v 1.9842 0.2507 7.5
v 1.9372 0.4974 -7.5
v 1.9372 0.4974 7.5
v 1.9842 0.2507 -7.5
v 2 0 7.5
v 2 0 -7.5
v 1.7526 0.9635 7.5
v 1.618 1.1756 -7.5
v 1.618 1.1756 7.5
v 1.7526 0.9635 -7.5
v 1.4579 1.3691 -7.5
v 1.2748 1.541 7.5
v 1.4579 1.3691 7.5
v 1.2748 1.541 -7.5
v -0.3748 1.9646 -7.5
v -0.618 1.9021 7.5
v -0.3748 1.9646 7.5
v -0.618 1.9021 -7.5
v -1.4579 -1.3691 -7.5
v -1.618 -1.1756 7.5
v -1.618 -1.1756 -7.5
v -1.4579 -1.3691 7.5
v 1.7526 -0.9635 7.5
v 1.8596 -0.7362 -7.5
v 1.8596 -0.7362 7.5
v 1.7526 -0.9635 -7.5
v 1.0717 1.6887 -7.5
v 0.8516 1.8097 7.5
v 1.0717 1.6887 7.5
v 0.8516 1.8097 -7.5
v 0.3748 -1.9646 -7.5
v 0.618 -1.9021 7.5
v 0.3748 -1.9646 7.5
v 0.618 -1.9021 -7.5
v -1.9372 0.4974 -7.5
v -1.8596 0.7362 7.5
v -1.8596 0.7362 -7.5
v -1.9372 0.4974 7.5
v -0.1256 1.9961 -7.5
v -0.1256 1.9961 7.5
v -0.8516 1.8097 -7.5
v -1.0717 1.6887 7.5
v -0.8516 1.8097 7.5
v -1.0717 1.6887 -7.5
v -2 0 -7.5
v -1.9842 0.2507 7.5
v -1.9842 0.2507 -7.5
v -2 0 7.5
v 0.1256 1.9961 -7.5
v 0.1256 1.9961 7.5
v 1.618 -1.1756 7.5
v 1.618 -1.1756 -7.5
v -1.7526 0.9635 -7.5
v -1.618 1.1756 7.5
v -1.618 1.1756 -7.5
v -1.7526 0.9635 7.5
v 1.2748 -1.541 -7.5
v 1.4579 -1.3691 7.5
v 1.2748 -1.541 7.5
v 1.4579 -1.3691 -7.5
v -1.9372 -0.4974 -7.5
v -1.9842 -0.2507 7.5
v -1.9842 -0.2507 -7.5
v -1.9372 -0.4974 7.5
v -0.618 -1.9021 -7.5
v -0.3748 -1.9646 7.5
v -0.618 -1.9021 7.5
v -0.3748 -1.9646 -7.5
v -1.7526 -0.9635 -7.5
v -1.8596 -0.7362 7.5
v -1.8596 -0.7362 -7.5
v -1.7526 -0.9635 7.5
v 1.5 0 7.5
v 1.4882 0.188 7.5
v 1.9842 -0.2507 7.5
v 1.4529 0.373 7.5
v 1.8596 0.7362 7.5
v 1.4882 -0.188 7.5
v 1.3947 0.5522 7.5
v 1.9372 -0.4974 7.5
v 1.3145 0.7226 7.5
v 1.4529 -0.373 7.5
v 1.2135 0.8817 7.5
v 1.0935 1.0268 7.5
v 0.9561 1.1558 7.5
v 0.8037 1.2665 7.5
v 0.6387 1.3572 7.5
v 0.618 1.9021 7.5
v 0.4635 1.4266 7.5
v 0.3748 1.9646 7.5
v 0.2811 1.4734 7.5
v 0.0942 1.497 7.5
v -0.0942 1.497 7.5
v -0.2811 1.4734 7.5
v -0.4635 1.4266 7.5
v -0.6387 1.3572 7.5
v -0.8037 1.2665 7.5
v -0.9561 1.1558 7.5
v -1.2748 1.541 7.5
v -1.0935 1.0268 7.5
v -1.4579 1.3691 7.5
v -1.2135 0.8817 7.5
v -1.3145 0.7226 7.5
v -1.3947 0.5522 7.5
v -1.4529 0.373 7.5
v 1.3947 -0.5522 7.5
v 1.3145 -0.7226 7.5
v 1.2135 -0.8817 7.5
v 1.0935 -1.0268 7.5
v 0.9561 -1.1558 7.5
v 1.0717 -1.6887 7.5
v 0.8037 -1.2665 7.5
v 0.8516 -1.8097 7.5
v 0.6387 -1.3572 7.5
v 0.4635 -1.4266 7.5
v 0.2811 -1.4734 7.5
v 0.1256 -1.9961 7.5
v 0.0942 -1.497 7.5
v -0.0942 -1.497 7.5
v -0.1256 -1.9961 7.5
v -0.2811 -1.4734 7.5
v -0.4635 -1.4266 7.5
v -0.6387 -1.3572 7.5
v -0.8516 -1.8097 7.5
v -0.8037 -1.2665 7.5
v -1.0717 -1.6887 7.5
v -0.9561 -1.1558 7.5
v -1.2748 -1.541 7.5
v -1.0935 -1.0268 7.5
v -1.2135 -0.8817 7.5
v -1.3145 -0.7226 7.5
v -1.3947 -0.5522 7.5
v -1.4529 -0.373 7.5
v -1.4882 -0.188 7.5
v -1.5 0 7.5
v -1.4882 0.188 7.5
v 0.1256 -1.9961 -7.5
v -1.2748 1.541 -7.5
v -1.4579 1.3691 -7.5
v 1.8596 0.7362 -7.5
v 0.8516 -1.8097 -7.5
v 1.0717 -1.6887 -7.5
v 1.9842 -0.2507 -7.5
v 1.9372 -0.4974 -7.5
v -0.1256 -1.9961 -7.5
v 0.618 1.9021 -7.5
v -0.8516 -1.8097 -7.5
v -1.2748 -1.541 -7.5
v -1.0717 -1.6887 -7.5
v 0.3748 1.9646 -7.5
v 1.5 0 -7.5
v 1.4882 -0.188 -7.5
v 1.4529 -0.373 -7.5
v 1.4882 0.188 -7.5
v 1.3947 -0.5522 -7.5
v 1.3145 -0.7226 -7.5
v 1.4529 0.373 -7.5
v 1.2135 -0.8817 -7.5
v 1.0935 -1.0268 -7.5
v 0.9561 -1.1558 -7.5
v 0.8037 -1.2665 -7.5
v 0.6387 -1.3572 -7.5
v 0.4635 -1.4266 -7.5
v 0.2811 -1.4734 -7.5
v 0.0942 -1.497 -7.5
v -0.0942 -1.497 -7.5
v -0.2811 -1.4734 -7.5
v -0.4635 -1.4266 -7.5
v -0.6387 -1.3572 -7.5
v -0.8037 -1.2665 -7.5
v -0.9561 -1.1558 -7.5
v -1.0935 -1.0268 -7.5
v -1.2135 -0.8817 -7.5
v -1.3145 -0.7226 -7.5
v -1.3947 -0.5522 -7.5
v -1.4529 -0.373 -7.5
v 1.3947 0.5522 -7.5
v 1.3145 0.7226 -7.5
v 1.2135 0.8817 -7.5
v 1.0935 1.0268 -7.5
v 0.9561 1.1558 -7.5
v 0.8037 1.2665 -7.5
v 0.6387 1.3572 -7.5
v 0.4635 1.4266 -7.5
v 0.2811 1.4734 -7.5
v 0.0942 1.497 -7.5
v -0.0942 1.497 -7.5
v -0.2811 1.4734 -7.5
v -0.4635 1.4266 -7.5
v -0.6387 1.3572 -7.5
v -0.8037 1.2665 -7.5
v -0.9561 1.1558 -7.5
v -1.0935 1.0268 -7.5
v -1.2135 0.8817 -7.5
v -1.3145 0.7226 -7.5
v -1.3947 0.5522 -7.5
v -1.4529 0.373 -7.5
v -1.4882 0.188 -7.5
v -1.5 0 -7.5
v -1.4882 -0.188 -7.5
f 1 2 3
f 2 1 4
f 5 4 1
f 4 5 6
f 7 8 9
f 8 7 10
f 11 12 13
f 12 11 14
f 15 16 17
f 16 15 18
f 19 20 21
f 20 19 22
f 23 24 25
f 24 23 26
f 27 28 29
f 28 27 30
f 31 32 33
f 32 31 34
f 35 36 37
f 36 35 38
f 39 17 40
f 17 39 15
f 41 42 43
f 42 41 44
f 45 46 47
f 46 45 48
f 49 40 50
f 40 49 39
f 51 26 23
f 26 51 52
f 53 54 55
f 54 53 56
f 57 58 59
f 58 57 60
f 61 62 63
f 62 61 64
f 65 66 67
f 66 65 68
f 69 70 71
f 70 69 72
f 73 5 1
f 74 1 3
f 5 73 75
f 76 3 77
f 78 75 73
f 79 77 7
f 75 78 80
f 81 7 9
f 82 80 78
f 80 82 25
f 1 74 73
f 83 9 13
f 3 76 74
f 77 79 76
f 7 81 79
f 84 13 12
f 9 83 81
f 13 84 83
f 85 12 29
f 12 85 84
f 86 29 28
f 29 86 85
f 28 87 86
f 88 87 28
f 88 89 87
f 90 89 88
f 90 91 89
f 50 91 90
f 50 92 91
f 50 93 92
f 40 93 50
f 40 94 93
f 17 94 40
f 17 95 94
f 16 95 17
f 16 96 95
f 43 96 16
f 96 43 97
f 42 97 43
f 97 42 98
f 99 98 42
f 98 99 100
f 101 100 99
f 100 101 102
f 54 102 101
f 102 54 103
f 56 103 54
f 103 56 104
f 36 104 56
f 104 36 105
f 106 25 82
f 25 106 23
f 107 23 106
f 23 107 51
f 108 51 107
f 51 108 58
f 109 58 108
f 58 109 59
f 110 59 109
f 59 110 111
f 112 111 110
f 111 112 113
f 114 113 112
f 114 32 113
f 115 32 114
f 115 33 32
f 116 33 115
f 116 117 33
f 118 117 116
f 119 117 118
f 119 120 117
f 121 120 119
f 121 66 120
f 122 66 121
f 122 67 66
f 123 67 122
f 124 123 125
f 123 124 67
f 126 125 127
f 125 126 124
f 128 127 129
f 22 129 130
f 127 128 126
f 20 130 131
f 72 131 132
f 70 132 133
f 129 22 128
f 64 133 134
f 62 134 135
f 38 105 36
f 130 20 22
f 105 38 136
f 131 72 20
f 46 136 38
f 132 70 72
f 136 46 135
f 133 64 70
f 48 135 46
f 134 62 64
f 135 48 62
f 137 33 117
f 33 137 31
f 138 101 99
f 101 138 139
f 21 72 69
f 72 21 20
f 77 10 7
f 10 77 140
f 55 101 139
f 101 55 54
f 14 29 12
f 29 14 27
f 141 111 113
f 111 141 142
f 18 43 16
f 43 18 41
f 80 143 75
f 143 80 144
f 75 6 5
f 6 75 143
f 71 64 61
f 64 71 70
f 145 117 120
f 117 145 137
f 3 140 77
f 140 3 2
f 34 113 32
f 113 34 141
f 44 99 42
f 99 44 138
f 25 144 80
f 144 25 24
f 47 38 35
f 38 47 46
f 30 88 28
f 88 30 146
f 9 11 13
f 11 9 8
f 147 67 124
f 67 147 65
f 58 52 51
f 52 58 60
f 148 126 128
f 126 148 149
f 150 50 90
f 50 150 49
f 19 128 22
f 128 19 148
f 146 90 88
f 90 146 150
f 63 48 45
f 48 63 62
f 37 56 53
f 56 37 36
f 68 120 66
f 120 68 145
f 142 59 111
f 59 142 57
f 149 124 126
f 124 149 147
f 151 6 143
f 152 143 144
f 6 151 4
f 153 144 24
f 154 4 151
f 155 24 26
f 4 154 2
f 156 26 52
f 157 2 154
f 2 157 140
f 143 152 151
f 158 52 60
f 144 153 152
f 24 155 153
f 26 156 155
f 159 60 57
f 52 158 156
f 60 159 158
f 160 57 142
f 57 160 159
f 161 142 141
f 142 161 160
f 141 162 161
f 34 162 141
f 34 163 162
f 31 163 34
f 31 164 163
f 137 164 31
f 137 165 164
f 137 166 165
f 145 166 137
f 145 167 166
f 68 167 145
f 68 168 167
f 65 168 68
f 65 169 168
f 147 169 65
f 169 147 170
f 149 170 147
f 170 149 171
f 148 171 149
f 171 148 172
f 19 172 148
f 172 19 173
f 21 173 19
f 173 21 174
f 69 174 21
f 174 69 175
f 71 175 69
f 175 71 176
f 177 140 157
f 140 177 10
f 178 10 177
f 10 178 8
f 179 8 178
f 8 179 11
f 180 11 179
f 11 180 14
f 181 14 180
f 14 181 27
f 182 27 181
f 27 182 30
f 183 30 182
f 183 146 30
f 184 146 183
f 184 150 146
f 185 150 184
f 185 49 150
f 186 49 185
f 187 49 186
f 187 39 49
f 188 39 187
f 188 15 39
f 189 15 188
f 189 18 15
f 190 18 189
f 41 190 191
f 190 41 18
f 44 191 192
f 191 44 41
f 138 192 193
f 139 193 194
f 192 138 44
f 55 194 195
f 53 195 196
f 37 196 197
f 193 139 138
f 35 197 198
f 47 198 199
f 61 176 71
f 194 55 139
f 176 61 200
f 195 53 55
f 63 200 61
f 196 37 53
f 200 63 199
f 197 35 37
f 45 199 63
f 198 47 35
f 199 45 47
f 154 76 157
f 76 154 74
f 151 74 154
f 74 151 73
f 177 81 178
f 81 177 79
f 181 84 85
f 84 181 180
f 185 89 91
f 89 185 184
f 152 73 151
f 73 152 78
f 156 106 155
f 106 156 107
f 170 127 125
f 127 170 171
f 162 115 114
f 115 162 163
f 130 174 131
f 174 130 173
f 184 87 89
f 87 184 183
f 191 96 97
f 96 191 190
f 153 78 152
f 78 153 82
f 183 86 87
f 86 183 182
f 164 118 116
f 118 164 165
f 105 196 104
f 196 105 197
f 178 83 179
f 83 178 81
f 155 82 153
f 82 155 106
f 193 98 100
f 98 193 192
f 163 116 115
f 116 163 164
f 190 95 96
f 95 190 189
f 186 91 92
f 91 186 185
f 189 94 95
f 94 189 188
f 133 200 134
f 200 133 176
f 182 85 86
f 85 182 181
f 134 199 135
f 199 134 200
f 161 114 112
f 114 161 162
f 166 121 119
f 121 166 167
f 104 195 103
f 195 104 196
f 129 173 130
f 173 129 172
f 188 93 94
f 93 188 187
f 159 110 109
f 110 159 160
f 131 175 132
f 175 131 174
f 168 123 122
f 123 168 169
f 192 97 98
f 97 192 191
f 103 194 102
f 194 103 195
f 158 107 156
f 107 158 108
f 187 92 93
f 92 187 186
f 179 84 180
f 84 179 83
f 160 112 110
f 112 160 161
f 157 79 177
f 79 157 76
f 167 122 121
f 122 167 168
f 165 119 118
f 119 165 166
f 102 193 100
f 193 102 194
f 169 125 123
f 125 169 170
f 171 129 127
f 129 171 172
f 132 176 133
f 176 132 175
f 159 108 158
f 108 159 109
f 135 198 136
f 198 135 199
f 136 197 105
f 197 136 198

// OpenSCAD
$fn = 50;


difference() {
	union() {
		translate(v = [0, 0, -7.5000000000]) {
			cylinder(h = 15, r = 2.0000000000);
		}
	}
	union() {
		translate(v = [0, 0, -100.0000000000]) {
			cylinder(h = 200, r = 1.5000000000);
		}
	}
}
